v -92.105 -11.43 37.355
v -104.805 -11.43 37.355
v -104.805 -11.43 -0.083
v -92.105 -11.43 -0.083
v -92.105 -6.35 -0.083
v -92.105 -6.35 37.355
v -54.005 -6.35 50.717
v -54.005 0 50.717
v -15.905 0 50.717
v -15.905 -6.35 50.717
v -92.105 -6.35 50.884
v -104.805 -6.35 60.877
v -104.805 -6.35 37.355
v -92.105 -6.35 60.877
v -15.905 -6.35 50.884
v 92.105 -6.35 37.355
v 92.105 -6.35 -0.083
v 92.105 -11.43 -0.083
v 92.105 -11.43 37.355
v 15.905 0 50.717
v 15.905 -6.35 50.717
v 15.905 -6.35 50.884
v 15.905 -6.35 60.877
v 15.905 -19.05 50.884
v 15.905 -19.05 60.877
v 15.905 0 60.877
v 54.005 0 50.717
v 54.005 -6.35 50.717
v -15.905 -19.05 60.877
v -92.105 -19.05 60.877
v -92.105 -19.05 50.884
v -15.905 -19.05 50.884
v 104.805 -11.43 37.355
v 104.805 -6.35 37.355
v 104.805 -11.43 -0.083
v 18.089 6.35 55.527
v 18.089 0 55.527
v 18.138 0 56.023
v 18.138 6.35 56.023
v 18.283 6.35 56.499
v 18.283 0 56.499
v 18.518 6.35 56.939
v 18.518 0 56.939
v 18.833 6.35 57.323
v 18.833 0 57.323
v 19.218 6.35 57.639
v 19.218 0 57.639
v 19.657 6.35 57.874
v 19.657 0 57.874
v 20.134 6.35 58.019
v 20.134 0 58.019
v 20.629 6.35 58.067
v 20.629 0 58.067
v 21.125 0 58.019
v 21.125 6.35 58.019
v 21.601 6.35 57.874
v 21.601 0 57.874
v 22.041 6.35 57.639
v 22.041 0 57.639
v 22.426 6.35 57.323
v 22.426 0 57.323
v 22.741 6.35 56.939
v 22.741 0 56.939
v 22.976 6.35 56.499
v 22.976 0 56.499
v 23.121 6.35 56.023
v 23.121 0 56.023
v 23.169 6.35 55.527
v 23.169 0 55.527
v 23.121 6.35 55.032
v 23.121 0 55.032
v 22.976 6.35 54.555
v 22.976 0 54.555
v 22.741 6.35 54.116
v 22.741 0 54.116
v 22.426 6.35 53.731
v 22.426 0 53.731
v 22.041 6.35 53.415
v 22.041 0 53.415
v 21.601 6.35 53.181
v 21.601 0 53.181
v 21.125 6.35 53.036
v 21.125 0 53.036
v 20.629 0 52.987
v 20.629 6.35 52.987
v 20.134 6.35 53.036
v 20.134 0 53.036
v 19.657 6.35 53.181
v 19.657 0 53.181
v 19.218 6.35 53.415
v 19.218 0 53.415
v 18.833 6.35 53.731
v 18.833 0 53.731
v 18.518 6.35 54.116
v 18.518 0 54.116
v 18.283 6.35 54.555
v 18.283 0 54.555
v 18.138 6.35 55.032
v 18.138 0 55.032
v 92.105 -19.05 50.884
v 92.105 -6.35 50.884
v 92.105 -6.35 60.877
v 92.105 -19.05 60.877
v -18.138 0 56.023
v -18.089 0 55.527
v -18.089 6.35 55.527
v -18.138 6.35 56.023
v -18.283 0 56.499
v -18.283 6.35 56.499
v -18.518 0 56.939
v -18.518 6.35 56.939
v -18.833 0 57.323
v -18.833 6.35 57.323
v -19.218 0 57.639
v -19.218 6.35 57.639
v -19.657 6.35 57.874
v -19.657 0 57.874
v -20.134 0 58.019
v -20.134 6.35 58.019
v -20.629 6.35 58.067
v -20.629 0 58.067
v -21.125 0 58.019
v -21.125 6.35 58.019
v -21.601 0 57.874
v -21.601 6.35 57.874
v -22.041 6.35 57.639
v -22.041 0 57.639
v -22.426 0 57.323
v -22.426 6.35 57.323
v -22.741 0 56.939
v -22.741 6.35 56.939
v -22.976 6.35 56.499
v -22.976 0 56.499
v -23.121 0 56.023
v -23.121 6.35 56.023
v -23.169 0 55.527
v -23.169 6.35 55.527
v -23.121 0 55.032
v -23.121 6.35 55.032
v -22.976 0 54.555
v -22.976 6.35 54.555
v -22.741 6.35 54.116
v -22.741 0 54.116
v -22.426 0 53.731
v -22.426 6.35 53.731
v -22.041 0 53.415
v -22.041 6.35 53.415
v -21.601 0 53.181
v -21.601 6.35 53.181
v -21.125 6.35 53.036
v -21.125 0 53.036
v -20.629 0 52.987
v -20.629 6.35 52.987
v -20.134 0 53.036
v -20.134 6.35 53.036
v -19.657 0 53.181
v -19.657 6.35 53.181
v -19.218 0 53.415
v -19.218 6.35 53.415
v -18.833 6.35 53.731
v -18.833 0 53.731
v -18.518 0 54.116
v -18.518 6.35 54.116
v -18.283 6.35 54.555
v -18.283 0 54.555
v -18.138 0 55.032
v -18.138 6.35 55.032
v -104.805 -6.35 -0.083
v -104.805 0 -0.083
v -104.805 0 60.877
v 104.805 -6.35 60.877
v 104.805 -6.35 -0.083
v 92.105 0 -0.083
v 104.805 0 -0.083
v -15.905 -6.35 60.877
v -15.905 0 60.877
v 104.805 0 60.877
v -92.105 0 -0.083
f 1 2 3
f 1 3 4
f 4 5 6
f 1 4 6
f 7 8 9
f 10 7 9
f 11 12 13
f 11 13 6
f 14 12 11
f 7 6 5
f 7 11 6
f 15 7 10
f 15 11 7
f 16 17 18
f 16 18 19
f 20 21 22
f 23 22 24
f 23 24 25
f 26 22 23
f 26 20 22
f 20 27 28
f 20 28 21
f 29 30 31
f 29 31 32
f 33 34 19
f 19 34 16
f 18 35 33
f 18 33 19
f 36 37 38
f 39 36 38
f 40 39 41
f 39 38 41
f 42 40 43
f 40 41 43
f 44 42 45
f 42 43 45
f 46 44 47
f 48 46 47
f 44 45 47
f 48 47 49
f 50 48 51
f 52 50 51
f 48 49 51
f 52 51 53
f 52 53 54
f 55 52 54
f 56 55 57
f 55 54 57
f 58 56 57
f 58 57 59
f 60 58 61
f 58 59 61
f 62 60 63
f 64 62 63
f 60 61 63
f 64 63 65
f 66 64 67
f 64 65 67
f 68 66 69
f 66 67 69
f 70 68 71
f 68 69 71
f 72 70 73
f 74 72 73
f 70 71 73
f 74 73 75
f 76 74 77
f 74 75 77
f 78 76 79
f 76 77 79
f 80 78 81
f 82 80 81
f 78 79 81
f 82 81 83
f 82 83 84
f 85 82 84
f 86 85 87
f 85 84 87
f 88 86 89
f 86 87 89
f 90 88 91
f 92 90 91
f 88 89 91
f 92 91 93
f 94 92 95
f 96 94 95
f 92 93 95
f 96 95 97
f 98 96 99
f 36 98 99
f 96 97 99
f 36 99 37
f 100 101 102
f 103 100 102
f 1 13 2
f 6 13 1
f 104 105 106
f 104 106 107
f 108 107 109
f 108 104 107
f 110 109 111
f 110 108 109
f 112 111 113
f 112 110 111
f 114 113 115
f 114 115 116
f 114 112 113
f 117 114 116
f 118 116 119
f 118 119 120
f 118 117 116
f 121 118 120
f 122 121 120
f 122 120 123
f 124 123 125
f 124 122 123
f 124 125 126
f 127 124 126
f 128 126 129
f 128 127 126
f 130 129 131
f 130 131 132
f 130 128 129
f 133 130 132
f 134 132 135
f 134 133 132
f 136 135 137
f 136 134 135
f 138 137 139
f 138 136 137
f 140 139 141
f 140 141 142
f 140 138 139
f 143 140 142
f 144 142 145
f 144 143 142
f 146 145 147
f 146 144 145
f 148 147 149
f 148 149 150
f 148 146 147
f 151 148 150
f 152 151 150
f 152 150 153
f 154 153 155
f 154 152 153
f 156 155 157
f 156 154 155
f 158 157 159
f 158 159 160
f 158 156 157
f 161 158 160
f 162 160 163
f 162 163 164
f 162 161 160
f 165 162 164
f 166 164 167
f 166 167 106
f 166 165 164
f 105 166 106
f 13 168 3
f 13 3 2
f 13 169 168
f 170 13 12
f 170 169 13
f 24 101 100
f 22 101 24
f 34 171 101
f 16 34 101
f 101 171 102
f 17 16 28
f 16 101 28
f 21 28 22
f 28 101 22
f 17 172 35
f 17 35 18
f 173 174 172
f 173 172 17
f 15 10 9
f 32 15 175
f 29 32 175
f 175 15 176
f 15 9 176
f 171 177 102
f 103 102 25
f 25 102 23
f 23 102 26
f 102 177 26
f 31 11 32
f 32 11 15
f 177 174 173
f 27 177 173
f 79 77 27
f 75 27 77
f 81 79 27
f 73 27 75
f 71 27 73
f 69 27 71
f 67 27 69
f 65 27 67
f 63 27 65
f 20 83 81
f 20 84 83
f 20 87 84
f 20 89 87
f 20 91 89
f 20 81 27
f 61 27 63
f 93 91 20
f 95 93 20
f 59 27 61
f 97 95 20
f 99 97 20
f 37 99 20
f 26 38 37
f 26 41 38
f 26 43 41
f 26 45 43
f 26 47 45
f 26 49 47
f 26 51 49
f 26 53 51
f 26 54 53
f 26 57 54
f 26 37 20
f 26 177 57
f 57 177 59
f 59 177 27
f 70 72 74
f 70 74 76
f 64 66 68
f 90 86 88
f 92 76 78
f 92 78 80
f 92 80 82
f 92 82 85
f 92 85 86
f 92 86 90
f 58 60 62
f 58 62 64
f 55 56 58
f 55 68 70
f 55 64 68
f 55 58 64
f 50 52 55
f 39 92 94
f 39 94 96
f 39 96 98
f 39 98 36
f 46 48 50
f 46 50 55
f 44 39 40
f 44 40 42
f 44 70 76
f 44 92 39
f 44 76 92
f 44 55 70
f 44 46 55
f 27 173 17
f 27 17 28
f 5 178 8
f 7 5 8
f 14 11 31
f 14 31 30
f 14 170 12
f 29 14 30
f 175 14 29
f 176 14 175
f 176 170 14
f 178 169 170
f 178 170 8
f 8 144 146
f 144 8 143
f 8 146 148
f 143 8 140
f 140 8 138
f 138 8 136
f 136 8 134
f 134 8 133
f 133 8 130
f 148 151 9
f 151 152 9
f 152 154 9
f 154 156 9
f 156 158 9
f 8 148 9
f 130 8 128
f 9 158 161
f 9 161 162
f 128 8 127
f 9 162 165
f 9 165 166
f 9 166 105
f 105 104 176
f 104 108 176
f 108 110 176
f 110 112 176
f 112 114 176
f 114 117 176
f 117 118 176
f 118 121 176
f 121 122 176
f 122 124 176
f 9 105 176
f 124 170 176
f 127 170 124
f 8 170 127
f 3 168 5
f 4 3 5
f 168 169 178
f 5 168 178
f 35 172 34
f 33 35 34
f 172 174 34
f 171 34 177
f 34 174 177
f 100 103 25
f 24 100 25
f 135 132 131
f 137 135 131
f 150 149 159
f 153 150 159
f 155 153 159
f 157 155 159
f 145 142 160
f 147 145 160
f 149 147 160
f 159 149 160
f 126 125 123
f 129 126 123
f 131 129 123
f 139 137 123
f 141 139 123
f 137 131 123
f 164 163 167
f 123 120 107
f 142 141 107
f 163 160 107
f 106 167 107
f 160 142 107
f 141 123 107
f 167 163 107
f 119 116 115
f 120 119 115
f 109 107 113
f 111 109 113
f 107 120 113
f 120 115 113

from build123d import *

# Parameters (mm, degrees)
F1_DEPTH  = 6.35
F2_W      = 12.7
F2_H      = 37.4380293493
F3_DEPTH  = 5.08
F4_R      = 2.54
F5_DEPTH  = 6.35
F9_ANGLE  = 180
F13_W     = 76.2
F13_H     = 9.9927893933
F14_DEPTH = 12.7


with BuildPart() as f1:
    # F0 (on Front) → F1 (new body)
    with BuildSketch(Plane.XZ):
        Polygon((-104.8047976519, -0.0827553873), (-92.1047976519, -0.0827553873), (-92.1047976519, 50.7172446127), (-92.1047976519, 60.8772446127), (-104.8047976519, 60.8772446127), align=None)
        Polygon((-92.1047976519, 50.7172446127), (-92.1047976519, -0.0827553873), (-54.0047976519, 50.7172446127), align=None)
        Polygon((-92.1047976519, 60.8772446127), (-92.1047976519, 50.7172446127), (-54.0047976519, 50.7172446127), (-15.9047976519, 50.7172446127), (-15.9047976519, 60.8772446127), align=None)
    extrude(amount=F1_DEPTH)

    # F2 (on face) → F3 (join)
    with BuildSketch(Plane.XZ.offset(6.35)):
        with Locations((-98.4547976519, 18.6362592874)):
            Rectangle(F2_W, F2_H)
    extrude(amount=F3_DEPTH)

    # F4 (on face) → F5 (join)
    with BuildSketch(Plane.XZ):
        with Locations((-20.6294525415, 55.5273666978)):
            Circle(F4_R)
    extrude(amount=-F5_DEPTH)


with BuildPart() as f6_1:
    # F6: copy of F1
    add(f1.part.moved(Location((163.83, -4.572, -13.716))))


with BuildPart() as f8_1:
    # F8: copy of F1
    add(f1.part.moved(Location((137.414, 0, 0))))


with BuildPart() as f9_1:
    # F9: copy of F8_1
    add(f8_1.part.rotate(Axis((121.5092023481, -3.175, 60.8772446127), (0, -1, 0)), F9_ANGLE))


with BuildPart() as f11_1:
    # F11: instance of F1
    add(f1.part.mirror(Plane.YZ))


with BuildPart() as f1_1:
    add(f1.part)

    # F13 (on face) → F14 (join)
    with BuildSketch(Plane.XZ.offset(6.35)):
        with Locations((-54.0047976519, 55.8808499161)):
            Rectangle(F13_W, F13_H)
    extrude(amount=F14_DEPTH)


with BuildPart() as f16_1:
    # F16: instance of F1
    add(f1_1.part.mirror(Plane.YZ))


solid = Compound([f1_1.part, f16_1.part])
